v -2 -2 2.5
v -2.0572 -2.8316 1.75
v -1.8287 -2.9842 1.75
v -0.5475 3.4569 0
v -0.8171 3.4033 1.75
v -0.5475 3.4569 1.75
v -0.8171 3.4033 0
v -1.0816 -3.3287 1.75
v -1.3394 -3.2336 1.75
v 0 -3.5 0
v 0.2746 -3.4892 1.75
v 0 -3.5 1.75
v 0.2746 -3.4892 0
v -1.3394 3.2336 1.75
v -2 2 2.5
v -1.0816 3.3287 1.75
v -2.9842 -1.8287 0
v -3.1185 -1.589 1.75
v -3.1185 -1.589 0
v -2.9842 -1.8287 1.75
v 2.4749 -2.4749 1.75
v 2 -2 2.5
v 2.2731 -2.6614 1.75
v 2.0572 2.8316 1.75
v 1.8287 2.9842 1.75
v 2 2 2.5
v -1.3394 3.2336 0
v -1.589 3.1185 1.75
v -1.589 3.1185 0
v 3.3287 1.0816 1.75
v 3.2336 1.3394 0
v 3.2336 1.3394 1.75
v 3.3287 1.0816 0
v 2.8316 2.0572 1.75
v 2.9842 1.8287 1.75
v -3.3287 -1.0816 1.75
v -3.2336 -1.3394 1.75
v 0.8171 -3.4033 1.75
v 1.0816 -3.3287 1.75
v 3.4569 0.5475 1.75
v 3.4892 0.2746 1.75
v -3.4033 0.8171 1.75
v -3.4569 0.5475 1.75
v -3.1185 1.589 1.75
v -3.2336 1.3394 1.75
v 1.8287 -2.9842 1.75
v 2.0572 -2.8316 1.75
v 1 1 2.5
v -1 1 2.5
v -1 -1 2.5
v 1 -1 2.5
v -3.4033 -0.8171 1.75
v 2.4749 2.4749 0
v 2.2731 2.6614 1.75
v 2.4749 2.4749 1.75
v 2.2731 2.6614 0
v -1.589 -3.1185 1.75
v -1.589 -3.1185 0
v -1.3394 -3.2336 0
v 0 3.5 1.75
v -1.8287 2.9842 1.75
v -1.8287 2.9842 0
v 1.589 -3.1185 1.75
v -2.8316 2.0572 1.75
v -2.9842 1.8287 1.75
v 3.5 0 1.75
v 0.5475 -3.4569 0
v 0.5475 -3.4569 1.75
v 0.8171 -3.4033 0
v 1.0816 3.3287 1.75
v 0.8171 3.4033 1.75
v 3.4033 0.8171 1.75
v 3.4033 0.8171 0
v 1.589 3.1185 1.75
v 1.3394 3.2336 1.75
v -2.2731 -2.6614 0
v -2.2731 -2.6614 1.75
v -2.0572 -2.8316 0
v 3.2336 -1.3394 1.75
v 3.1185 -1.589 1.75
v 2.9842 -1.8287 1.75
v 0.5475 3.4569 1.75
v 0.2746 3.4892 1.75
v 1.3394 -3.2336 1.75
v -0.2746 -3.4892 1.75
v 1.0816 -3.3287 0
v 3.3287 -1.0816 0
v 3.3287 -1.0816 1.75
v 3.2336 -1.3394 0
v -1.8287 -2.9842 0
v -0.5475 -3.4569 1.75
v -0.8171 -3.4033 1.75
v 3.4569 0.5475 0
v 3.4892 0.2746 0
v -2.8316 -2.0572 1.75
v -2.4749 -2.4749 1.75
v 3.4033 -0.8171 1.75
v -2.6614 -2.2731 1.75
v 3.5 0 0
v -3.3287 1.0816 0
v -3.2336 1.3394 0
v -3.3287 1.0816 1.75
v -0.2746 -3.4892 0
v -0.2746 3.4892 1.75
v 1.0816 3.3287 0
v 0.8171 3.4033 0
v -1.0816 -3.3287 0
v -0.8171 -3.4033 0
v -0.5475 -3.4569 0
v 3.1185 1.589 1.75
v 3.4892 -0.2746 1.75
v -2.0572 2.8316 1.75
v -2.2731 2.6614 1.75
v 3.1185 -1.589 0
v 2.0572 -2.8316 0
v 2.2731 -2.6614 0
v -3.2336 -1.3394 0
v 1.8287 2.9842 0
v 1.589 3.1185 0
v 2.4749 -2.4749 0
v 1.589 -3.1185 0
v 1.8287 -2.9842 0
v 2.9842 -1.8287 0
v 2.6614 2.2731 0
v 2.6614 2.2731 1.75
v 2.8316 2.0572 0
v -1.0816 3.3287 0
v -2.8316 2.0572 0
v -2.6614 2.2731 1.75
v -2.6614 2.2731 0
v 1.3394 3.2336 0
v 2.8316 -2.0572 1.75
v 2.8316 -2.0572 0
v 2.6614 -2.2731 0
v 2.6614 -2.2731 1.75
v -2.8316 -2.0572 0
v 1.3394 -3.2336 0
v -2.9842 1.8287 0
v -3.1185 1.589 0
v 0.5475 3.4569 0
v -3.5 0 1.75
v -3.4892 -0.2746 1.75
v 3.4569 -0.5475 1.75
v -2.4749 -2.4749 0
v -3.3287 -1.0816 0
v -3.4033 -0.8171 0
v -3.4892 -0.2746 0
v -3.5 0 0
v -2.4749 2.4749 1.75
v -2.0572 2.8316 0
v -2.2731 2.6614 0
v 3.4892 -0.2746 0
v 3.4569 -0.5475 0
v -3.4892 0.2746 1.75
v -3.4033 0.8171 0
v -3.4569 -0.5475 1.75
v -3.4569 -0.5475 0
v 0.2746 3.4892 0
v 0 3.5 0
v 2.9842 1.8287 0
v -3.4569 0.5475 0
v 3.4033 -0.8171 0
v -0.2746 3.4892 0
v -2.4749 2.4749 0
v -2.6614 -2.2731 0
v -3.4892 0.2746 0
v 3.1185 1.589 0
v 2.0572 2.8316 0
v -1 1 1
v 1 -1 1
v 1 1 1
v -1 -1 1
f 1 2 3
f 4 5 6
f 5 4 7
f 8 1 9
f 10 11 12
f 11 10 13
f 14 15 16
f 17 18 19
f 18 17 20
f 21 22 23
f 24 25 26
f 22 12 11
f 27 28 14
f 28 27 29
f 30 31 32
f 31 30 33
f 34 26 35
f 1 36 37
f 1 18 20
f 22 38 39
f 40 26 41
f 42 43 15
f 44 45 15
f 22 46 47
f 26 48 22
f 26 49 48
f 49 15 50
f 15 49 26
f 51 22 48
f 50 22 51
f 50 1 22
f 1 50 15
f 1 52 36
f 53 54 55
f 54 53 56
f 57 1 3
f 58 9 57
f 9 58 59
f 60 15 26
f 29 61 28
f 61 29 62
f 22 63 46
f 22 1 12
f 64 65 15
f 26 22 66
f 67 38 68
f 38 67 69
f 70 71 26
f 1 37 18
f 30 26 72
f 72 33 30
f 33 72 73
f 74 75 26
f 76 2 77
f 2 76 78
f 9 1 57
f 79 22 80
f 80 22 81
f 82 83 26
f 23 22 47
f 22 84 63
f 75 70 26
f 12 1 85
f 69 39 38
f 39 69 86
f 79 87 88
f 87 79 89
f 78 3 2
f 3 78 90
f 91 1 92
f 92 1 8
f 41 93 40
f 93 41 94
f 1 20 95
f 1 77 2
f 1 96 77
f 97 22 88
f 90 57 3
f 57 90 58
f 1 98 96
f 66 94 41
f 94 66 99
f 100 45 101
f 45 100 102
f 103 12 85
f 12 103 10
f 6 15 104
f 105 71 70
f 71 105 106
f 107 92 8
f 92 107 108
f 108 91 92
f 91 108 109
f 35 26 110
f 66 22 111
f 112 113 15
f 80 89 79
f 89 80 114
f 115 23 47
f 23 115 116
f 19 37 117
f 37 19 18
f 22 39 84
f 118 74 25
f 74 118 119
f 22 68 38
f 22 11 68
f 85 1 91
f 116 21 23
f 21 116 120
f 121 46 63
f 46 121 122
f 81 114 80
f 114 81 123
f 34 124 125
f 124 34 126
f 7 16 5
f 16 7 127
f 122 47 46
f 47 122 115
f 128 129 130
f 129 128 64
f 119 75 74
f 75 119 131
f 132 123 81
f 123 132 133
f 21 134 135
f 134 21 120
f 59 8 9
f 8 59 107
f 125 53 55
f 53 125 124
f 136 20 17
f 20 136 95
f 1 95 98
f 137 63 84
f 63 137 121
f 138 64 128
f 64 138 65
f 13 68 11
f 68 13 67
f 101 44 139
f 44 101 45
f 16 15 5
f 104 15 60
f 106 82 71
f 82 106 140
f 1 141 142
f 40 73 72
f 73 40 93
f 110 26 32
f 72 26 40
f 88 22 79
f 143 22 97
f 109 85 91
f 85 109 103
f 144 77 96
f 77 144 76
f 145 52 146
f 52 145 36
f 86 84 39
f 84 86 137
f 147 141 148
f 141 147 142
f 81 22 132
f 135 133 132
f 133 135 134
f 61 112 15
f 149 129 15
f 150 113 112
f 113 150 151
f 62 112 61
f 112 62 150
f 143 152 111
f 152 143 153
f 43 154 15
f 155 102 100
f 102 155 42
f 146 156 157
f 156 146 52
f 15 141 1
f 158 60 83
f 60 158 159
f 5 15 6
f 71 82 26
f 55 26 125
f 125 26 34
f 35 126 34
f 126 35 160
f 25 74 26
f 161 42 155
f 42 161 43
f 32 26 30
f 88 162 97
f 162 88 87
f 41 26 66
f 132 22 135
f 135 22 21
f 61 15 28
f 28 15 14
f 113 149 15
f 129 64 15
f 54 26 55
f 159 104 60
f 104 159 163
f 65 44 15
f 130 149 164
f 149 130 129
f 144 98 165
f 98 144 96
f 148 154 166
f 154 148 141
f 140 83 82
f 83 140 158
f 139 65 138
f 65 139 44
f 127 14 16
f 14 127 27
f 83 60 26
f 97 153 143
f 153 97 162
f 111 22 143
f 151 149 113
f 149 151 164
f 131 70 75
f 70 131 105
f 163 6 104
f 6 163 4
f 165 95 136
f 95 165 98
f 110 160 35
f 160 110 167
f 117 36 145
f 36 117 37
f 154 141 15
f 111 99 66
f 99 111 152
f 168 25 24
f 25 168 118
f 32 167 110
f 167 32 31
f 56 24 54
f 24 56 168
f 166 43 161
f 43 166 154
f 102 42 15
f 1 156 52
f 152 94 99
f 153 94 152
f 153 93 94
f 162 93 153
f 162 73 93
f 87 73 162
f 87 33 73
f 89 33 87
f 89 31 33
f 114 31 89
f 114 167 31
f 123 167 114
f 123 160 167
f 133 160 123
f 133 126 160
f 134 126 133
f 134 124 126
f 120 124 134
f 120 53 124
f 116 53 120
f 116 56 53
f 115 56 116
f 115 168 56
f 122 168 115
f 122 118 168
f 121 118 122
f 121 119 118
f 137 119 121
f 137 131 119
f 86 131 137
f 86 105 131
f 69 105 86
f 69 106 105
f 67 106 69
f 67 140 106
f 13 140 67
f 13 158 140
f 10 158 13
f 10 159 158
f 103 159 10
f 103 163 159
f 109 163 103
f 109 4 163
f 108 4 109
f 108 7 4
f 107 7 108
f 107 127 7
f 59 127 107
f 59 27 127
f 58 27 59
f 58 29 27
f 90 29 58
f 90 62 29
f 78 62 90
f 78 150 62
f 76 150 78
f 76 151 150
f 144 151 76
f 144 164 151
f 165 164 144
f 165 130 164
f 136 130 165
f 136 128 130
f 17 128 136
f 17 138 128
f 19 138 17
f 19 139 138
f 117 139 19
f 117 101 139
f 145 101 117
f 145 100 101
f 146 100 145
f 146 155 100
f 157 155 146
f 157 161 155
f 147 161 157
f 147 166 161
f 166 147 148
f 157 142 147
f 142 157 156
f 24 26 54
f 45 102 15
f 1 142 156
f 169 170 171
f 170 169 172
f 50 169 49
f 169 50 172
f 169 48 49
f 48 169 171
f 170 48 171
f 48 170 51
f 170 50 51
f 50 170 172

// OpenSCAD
// Business Card Joystick Cover
// Dan Schnur
// Tempe Technology
// 9/18/2020

$fn = 80;

difference() {
    hull() {
        linear_extrude(height = 1.75) {
            circle(d=7);
        }
        translate([0,0,.5]) {
            linear_extrude(height = 2) {
            square([4,4],center=true);  
        }
    }
}
    translate([0,0,1]) {
        linear_extrude(height = 4.75) {
            square([2,2],center=true);
        }
    }
}
